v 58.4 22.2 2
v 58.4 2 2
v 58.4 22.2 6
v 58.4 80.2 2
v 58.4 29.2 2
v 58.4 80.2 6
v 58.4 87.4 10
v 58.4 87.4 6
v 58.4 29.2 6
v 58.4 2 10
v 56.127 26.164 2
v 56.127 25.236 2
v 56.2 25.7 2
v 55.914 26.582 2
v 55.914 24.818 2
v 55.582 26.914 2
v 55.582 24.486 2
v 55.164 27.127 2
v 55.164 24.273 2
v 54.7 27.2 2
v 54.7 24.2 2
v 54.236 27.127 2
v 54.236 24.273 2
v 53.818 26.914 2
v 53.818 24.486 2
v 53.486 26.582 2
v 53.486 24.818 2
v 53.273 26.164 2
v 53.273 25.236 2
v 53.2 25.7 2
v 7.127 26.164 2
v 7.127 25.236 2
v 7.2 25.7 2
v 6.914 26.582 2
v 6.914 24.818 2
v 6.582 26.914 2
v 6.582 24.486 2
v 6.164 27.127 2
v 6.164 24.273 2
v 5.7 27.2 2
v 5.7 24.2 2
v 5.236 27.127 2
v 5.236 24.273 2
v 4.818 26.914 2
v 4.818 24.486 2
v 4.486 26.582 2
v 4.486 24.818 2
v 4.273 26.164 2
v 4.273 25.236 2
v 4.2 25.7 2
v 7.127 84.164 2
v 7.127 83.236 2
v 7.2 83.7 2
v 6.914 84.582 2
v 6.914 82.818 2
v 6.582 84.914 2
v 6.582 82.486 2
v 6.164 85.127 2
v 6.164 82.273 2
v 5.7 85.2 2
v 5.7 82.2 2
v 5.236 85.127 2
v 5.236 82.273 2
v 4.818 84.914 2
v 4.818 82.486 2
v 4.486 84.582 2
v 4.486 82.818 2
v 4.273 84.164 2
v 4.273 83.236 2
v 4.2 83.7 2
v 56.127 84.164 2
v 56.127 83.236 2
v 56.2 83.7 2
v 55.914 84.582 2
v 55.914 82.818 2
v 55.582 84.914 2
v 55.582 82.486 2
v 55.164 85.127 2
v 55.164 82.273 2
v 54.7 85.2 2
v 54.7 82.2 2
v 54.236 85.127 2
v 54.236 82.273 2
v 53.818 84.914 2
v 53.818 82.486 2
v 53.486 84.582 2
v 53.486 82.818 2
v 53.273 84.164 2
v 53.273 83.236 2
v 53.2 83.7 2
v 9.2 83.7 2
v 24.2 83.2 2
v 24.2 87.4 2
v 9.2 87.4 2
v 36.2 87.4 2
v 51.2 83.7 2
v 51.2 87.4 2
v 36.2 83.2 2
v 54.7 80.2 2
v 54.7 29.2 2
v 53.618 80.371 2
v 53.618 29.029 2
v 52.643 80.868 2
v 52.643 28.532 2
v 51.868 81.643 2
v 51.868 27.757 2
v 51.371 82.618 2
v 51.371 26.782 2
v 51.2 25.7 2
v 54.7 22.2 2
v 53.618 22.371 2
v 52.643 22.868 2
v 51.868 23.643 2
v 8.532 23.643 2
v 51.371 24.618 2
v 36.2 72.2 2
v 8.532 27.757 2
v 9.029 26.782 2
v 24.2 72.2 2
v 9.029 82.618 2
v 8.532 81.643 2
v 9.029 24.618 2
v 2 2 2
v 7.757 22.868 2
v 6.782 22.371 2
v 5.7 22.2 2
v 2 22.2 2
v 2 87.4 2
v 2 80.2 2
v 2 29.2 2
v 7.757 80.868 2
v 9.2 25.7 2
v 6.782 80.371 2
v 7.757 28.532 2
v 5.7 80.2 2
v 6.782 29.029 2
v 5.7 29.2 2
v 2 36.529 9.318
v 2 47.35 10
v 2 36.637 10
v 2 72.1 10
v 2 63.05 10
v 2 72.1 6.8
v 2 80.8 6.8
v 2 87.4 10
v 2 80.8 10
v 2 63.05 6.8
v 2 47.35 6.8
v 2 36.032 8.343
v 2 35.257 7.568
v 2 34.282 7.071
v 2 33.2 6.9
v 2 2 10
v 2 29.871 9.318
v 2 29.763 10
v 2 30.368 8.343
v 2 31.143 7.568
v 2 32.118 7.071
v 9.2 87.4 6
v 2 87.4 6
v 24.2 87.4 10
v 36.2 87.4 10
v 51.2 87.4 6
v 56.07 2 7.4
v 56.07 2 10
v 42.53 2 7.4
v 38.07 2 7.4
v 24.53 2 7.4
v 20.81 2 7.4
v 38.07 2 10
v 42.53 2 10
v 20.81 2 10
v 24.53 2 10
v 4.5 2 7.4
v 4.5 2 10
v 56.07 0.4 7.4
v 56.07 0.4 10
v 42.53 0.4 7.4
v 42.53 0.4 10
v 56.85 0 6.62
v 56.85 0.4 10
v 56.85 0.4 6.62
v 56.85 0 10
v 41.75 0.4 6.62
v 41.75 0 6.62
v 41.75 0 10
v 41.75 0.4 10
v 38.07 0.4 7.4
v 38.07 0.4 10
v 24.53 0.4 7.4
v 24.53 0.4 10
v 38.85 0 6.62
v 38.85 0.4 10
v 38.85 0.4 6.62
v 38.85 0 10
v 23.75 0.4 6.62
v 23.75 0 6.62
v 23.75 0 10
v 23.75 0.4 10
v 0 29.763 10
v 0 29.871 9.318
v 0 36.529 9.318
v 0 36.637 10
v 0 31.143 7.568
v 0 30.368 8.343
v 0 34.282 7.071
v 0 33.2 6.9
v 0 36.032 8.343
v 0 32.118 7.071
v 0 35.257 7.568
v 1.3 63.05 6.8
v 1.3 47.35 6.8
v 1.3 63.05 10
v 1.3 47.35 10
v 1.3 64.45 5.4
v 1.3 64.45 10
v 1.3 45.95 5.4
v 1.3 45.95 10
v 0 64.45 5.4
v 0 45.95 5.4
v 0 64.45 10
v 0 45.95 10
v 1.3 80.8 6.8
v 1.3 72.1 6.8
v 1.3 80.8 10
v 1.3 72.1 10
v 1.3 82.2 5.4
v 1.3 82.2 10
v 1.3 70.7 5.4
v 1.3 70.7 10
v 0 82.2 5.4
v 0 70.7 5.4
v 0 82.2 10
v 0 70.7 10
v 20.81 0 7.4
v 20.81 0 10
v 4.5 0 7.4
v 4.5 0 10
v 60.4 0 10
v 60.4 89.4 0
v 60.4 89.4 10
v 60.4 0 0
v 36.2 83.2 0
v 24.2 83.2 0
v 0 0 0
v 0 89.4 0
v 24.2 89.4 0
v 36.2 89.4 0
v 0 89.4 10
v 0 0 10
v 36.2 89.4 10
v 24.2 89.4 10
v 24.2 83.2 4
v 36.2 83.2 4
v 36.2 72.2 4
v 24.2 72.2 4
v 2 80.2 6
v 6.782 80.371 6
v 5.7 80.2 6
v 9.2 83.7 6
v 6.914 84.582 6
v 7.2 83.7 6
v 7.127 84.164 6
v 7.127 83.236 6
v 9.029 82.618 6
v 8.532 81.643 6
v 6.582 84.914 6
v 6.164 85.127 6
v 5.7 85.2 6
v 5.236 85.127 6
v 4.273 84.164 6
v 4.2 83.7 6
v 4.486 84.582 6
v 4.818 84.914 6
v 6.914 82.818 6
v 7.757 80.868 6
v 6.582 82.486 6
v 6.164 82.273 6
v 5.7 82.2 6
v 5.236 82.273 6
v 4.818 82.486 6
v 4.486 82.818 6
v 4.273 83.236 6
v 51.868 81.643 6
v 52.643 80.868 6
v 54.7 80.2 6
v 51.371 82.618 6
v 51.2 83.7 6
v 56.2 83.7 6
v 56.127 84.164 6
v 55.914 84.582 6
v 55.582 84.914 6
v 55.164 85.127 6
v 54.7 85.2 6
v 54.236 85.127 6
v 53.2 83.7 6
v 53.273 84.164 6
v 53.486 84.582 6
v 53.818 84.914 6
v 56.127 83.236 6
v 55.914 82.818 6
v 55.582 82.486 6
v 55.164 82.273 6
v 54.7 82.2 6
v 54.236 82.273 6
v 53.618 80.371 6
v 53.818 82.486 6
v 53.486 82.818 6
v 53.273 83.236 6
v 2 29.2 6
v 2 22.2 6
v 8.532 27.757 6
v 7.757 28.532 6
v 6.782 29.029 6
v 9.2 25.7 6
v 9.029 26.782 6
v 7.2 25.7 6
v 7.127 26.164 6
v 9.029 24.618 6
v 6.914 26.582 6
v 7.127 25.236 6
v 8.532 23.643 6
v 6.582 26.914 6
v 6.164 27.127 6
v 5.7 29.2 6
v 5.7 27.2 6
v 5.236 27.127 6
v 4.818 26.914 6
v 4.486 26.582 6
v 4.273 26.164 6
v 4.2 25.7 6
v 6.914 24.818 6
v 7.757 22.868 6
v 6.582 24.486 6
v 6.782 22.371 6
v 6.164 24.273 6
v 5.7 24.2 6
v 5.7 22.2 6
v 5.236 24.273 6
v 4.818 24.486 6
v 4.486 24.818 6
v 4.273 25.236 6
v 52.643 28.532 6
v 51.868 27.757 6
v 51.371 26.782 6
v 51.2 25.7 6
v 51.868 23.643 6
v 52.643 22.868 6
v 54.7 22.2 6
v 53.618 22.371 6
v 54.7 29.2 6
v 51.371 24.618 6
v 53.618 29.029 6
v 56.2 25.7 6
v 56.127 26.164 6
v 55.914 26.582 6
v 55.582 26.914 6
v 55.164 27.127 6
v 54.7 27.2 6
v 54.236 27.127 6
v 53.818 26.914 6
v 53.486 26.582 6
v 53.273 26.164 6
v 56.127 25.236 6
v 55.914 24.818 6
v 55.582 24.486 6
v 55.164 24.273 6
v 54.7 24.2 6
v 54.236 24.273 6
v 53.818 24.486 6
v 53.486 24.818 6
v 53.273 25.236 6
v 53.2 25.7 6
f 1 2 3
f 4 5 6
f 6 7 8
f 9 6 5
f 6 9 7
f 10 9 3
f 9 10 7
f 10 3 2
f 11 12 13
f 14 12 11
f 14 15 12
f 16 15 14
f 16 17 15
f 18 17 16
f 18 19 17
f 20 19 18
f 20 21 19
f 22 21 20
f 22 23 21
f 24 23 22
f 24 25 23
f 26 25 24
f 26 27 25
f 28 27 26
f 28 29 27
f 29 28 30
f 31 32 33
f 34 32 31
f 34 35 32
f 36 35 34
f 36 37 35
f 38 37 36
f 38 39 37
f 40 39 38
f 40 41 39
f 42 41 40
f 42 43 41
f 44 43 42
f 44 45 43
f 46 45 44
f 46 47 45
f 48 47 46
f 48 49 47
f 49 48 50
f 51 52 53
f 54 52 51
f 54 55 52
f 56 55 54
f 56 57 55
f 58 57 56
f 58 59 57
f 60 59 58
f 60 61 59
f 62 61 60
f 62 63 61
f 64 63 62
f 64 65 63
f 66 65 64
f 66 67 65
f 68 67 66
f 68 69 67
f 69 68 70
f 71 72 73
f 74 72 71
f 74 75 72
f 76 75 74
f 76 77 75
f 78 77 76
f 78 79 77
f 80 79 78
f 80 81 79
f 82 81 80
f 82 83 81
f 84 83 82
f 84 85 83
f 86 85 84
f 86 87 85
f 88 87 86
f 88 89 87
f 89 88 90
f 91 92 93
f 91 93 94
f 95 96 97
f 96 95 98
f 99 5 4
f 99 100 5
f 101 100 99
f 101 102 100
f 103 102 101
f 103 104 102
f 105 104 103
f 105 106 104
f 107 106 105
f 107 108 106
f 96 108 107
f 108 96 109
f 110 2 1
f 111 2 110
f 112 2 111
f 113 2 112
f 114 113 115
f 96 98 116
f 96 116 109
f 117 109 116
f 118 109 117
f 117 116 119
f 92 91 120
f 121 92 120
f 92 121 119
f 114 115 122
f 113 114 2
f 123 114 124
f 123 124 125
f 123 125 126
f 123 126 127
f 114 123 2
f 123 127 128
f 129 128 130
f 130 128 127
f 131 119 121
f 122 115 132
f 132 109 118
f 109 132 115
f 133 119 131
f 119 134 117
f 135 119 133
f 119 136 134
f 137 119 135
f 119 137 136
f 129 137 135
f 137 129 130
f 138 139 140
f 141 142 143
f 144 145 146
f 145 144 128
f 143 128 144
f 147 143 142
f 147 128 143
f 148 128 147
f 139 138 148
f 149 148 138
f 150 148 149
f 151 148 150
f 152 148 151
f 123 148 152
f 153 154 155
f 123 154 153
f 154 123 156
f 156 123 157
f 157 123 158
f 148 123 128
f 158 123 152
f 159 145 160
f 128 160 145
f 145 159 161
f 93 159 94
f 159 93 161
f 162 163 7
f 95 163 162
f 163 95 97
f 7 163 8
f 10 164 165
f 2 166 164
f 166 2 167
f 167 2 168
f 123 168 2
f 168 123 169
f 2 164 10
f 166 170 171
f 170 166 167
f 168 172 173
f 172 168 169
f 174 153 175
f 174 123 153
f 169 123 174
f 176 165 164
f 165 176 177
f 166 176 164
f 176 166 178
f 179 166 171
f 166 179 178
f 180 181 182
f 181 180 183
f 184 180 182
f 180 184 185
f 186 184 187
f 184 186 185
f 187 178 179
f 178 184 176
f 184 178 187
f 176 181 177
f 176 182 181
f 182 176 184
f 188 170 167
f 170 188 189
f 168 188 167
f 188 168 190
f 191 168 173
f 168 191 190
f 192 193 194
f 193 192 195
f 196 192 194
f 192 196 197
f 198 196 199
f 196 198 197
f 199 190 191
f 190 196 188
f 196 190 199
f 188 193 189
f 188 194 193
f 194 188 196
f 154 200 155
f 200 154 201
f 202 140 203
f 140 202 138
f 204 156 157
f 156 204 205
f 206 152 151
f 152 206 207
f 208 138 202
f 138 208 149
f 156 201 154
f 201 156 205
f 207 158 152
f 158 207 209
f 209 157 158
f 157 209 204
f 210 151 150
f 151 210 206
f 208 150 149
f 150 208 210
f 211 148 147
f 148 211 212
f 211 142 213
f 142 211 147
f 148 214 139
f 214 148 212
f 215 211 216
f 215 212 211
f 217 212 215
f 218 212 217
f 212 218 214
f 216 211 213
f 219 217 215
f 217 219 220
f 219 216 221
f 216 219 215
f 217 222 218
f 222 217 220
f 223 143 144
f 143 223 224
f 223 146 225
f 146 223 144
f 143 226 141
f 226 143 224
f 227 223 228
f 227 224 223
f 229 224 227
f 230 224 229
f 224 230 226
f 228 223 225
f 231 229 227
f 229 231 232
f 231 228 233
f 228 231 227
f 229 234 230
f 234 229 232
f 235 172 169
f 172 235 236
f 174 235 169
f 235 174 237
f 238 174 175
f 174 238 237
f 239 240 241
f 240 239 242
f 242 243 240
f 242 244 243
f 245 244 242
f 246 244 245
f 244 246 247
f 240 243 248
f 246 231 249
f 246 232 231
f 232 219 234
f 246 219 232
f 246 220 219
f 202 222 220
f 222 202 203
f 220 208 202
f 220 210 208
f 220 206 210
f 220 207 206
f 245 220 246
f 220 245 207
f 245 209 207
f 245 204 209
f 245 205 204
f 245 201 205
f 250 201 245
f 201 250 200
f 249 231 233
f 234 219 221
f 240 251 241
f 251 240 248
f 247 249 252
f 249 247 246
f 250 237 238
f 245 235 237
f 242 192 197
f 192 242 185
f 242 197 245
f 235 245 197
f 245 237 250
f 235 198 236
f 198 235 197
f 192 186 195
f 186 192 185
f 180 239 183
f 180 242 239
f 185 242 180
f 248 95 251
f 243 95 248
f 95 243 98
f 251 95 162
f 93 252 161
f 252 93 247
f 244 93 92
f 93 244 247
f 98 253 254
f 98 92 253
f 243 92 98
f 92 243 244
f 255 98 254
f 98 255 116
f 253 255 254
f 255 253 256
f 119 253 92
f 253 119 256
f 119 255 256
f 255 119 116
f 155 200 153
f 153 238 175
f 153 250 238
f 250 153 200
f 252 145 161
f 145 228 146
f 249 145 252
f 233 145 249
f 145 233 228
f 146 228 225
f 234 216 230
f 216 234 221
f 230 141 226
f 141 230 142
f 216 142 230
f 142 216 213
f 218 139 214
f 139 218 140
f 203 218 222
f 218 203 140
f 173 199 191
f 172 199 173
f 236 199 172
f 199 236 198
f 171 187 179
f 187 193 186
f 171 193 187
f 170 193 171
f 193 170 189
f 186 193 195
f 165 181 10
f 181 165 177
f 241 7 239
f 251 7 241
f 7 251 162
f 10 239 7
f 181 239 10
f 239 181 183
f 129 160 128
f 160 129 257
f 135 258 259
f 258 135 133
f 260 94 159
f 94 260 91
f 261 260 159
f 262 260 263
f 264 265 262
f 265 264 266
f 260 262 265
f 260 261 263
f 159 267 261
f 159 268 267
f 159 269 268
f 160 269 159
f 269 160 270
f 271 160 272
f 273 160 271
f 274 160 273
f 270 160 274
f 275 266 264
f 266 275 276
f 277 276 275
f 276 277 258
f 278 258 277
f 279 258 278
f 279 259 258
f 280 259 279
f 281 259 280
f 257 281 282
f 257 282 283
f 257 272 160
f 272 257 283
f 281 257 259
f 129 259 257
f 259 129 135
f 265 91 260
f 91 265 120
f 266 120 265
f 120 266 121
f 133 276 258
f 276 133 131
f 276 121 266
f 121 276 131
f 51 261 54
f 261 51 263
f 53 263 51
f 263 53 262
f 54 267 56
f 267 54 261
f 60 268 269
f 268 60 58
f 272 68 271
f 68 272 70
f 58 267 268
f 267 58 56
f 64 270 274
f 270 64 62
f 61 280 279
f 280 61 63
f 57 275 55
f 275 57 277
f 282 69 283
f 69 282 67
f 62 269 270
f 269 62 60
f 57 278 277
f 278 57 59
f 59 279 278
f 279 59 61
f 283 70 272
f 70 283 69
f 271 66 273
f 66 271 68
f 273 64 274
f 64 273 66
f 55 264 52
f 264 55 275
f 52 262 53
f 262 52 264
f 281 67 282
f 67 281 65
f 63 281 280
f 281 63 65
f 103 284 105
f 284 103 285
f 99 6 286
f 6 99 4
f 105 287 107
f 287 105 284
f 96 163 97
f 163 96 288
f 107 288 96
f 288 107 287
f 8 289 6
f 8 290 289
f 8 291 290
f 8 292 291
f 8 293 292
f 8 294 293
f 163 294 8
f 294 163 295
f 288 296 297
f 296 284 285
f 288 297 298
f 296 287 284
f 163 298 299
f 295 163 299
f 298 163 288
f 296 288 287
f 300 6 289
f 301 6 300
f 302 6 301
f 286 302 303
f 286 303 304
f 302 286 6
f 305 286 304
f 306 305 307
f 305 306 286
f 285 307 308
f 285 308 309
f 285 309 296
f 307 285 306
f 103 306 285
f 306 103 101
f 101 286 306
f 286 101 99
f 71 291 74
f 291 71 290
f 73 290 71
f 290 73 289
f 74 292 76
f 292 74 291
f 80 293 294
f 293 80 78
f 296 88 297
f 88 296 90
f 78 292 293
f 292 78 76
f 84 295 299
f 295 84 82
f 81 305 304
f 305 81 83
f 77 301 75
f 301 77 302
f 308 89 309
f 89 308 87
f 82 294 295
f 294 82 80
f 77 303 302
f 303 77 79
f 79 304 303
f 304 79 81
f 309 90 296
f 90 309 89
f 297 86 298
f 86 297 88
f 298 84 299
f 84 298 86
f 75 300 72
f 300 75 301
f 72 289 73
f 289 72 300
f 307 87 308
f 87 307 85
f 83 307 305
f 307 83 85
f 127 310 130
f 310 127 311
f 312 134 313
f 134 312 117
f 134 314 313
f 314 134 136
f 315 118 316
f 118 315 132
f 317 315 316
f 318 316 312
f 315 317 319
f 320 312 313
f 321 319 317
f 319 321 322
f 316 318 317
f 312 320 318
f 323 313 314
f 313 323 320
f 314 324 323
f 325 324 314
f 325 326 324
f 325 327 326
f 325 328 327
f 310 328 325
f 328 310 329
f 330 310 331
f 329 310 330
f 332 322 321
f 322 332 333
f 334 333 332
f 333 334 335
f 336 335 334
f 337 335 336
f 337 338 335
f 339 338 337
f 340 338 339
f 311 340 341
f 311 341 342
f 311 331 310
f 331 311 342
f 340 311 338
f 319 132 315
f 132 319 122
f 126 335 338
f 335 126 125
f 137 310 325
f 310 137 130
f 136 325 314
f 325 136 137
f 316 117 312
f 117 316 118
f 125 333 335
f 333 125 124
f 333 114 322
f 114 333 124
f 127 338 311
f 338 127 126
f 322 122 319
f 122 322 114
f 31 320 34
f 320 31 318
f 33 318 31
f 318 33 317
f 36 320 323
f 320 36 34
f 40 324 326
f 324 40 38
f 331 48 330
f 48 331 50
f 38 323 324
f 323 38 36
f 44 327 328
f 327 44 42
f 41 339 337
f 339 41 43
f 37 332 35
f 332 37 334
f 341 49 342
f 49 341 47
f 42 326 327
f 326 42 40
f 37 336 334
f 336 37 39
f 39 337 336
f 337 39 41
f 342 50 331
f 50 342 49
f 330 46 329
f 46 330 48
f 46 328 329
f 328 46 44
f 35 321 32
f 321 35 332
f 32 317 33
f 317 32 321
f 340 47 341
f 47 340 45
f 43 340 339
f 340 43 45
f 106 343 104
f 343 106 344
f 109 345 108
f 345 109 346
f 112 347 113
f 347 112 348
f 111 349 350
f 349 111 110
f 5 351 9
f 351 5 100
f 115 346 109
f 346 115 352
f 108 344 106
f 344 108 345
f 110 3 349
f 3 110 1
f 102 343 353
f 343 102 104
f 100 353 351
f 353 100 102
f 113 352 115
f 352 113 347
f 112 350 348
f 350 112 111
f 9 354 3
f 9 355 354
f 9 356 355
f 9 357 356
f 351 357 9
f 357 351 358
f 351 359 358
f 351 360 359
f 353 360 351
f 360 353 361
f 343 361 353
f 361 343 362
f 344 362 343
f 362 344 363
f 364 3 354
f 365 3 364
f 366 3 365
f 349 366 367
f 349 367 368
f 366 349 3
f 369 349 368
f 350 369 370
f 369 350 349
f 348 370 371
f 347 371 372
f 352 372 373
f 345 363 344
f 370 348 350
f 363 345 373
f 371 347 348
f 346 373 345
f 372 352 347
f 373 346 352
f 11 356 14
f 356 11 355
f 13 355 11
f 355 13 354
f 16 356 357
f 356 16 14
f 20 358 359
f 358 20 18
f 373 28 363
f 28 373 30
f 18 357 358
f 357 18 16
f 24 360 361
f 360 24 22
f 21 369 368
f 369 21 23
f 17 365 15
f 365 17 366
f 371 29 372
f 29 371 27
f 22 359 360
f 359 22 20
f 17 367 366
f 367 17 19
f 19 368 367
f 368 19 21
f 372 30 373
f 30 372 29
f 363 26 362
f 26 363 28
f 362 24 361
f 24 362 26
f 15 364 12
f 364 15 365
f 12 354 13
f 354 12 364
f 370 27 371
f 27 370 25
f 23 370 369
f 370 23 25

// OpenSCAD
/*
 * Raspberry Pi3 case for Prusa MK3

 * Originally not intended for use with the Prusa MK3; I just wanted a openscad code base to work with to make future cases.
 * I have borrowed the standoff design and the supports at the ports from https://www.thingiverse.com/thing:1325370
 
*/

/* [Main] */

// Which part to render
part = "base"; // [ lid: Lid, base: Base, both: Box ]

// Make slot for the camera cable
camera_slot = "true"; // [ true: Yes, false: No ]

// Make slot for the video cable
video_slot = "true"; // [ true: Yes, false: No ]

// Make slot for the gpio_connector (not implemented)
gpio_slot = "true"; // [ true: Yes, false: No ]

// Prusa i3 Mk3 mount
mk3_mount = "false"; // [ true: Yes, false: No ]

// Cover holes with single layer, helps some screw hole avoid need for supports, requires to be punched through afterwards ( thanks Angus for the tip )
hole_covers = "true"; // [ true: Yes, false: No ]

/* [Hidden] */

board = [85, 56 , 1.3 ];  //dimension of rasp pi
t     = 1.40;             //Thickness of rasp pi board
p     = 3;              //Thickness of plastic case

_t_wall    = 2;              // Thickness of outer walls
_t_b  = 2;              // Thickness of top and bottom
_rpi_w = 56;
_rpi_l = 85;
_rpi_padding = 0.2;
_rpi_t = 1.4;
_rpi_hole_l_offset = 58;

_inner_h = 12.8; // Just guessing here

_h_rpi_offset = 4 + _t_b;

// This cannot be fiddle with too much as it will break the stereo jack hole
_split_offset = 10;

_hole_offset = 3.5;

_outer_l = _t_wall*2 + _rpi_padding*2 + _rpi_l;
_outer_w = _t_wall*2 + _rpi_padding*2 + _rpi_w;
_outer_h = _t_b*2+_inner_h+_h_rpi_offset;

// translate([_t_wall+_rpi_padding,_t_wall+_rpi_padding,_h_rpi_offset]) rpi();

$fn=20;

//base();
//lid();
//box();

show();

module show() {
    if (part == "lid") {
        rotate([0,180,0]) translate([1,0,-_outer_h]) lid();
    } else if (part == "base") {
        base();
    } else {
        lid();
        base();
    }
}

module rpi() {
    difference() {
        union() {
            cube([_rpi_w,_rpi_l,_rpi_t]);


            // SD card
            _sd_width = 11;
            _sd_depth = 3;
            translate([_rpi_w/2-_sd_width/2,_rpi_l-_t_wall,-_rpi_t-1])
                cube([_sd_width,_sd_depth+_rpi_padding+_t_wall,1]);

            // USB 1
            //usb1  =  [[70   ,21.4 ,0] ,[17.4 ,15.3  , 17.4] ,[0,   -2,    0] , [0,   4, 10  ]];
            // 14.7 is the outer edge, the main module is 13.14
            translate([40.43,-2,_rpi_t]) {
                usb(padding=0);
            }


            // USB 2
            //usb2  =  [[70   ,39   ,0] ,[17.4 ,15.3  , 17.4] ,[0,   -2,    0] , [0,   4, 10  ]];
            translate([22.43,-2,_rpi_t]) {
                usb(padding=0);
            }


            // Ethernet
            translate([2.5,-2,_rpi_t])
                ether(padding=0);

            // Audio
            translate([0,31,_rpi_t])
                audio(padding=0);

            // HDMI
            translate([0,45.75,_rpi_t])
                hdmi(padding=0);

             // Micro USB
            translate([0,70.5,_rpi_t])
                musb(padding=0);

            // Camera
            translate([0,38.6,_rpi_t])
                cube([22.5,2.95,5.7]);

            // Video
            translate([_rpi_w/2-22.5/2,79.55,_rpi_t])
                cube([22.5,2.95,5.7]);

       }


        // holes
        translate([_hole_offset,_rpi_l-_hole_offset,-1]) cylinder(r=2.75/2,h=_rpi_t+2);
        translate([_rpi_w-_hole_offset,_rpi_l-_hole_offset,-1]) cylinder(r=2.75/2,h=_rpi_t+2);
        translate([_hole_offset,_rpi_l-3.5-_rpi_hole_l_offset,-1]) cylinder(r=2.75/2,h=_rpi_t+2);
        translate([_rpi_w-_hole_offset,_rpi_l-_hole_offset-_rpi_hole_l_offset,-1]) cylinder(r=2.75/2,h=_rpi_t+2);
    }
}

module usb(padding=0.2,extends=0.2) {
    _extra_width = (14.7-13.14);
    cube([13.14+2*padding,17.4+2*padding,15.3+padding]);
    translate([-(14.7+2*padding-13.14-2*padding)/2,-extends+0.2,-_extra_width/2]) cube([14.7+2*padding,extends,15.3+padding+_extra_width]);
}

module ether(padding=0.2,extends=0) {
    translate([0,-extends,0])
    cube([15.51+2*padding,21.45+extends,13.9+padding]);
}

module audio(padding=0.4,extends=0,hole=true) {
    $fn=20;
    difference() {
        union() {
            translate([0,0,3]) rotate([0,-90,0]) cylinder(r=3+padding,h=2+extends);
            translate([0,-3,0]) cube([11,6,6]);
        }
        if (hole) {
            translate([5,0,3]) rotate([0,-90,0]) cylinder(r=1.5,h=11);
        }
    }
}

module hdmi() {
    difference() {
        union() {
            translate([1,0,0]) cube([10.7,14.5,6.4]);
            hull() {
                translate([-1,0,2]) cube([10.7,14.5,4.4]);
                translate([-1,1,1]) cube([10.7,12.5,5.4]);
            }
        }
        hull() {
            translate([-2,0.5,2.3]) cube([10.7,13.5,3.6]);
            translate([-2,1.6,1.5]) cube([10.7,11.7,2]);
        }
    }
}

module hdmi_hole(padding=0.6,extends=5,outer_padding=2) {
    union() {
        translate([-1-0.1,-padding,-padding])
            cube([10.7+0.1,14.5+padding*2,6.4+padding*2]);

        translate([-1-extends,-outer_padding,-outer_padding])
            cube([extends,14.5+outer_padding*2,6.4+outer_padding*2]);
    }
}

module musb() {
    difference() {
        union() {
            translate([1,0,0]) cube([5.7,7.5,3]);
            hull() {
                translate([-1,0,1]) cube([5.7,7.5,2]);
                translate([-1,1,0.5]) cube([5.7,5.5,2]);
            }
        }
        hull() {
            translate([-1.1,0.2,1.2]) cube([5.7,7.1,1.6]);
            translate([-1.1,1.2,0.7]) cube([5.7,5.1,2]);
        }
    }
}

module musb_hole(padding=0.6,extends=5,outer_padding=2) {
    union() {
        translate([-1-0.1,-padding,-padding])
            cube([5.7+0.1,7.5+padding*2,3+padding*2]);

        translate([-1-extends,-outer_padding,-outer_padding])
            cube([extends,7.5+outer_padding*2,3+outer_padding*2]);
    }
}


module box() {
    
    _sd_width = 12;
    _sd_depth = 3;
    _sd_inset = 4;

    difference() {

        cube([_t_wall*2+_rpi_padding*2+_rpi_w,_t_wall*2+_rpi_padding*2+_rpi_l,_outer_h]);

        difference() {
            translate([_t_wall,_t_wall,_t_b])
                cube([_rpi_padding*2+_rpi_w,_rpi_padding*2+_rpi_l,_outer_h-2*_t_b]);

            translate([0,_t_wall,_outer_h-_t_b])
            rotate([0,90,0])
            linear_extrude(height=_outer_w)
                polygon([[0,0],[0,(_outer_h-_split_offset-_t_b)*0.8],[_outer_h-_split_offset-_t_b,0]]);

        }


        _hole_padding=0.2;

        // SD card slot
        // We assume the slot is "almost" centered
        translate([_t_wall + _rpi_padding + _rpi_w/2 - _sd_width/2, _outer_l-_t_wall-_rpi_padding-_sd_inset,-1])
            cube([_sd_width,_sd_depth+_rpi_padding+_t_wall+_sd_inset+1,_h_rpi_offset+1]);

        translate([_t_wall+_rpi_padding,_t_wall+_rpi_padding,_h_rpi_offset+_rpi_t]) {

            // USB 1
            translate([40.43-_hole_padding/2,-2,0]) {
                usb(padding=_hole_padding,extends=_t_wall);
            }

            // USB 2
            translate([22.43-_hole_padding/2,-2,0]) {
                usb(padding=_hole_padding,extends=_t_wall);
            }

            // Ether
            _ether_padding = _hole_padding + 0.2;
            translate([2.5-_ether_padding/2,-2,0])
                ether(padding=_ether_padding,extends=_t_wall);

            // Audio
            translate([0,31,0])
                audio(padding=0.5,extends=2,hole=false);

            // HDMI
            translate([0.1,45.75,0])
                hdmi_hole(extends=_t_wall*2);

            // Micro USB
            translate([0.1,70.5,0])
                musb_hole();

        }

        // Camera
        if (camera_slot == "true") {
            translate([_t_wall+_rpi_padding,_t_wall+_rpi_padding+38.6,_t_b+_inner_h])
                rounded_slot(22.5,2.95,20);
        }

        if (video_slot == "true") {
            // Video
            translate([_t_wall+_rpi_padding+_rpi_w/2-22.5/2,_t_wall+_rpi_padding+79.55,,_t_b+_inner_h])
                rounded_slot(22.5,2.95,20);
        }

        if (gpio_slot == "true") {
            translate([_t_wall+_rpi_padding+49.9,_t_wall+_rpi_padding+27,5]) cube([5.1,51,20]);
        }

        // Cooling
        translate([_t_wall+_rpi_padding+16,_t_wall+_rpi_padding+20,_t_b+_inner_h]) {
            translate([0,0,0]) rotate([0,0,45]) rounded_slot(22.5,2.95,20);
            translate([8,0,0]) rotate([0,0,45]) rounded_slot(22.5,2.95,20);
            translate([16,0,0]) rotate([0,0,45]) rounded_slot(22.5,2.95,20);
            if (gpio_slot == "true") {
               translate([24,0,0]) rotate([0,0,45]) rounded_slot(22.5/2,2.95,20);
            } else {
               translate([24,0,0]) rotate([0,0,45]) rounded_slot(22.5,2.95,20);
            }

        }

        translate([_t_wall+_rpi_padding+18,_t_wall+_rpi_padding+50,_t_b+_inner_h]) {
            translate([0,0,0]) rotate([0,0,125]) rounded_slot(22.5,2.95,20);
            translate([8,0,0]) rotate([0,0,125]) rounded_slot(22.5,2.95,20);
            translate([16,0,0]) rotate([0,0,125]) rounded_slot(22.5,2.95,20);
            translate([24,0,0]) rotate([0,0,125]) rounded_slot(22.5,2.95,20);
            if (gpio_slot == "true") {
                translate([32,0,0]) rotate([0,0,125]) translate([22.5/2,0,0]) rounded_slot(22.5/2,2.95,20);
            } else {
                translate([32,0,0]) rotate([0,0,125]) rounded_slot(22.5,2.95,20);
            }
        }

    }
    
    // SD card slot support
    // We assume the slot is "almost" centered
    
    translate([_t_wall + _rpi_padding + _rpi_w/2 - _sd_width/2, _outer_l-_t_wall-_rpi_padding-11-_sd_inset,0])
        cube([_sd_width,11,_h_rpi_offset-2]);



}

module rounded_slot(l,t,h) {
    translate([t/2,t/2,0])
    hull() {
        cylinder(r=t/2,h=h);
        translate([l-t,0,0]) cylinder(r=t/2,h=h);
    }
}


module lid_cut() {
    difference() {
        box();
        translate([-1,-1,_split_offset-200])
            cube([_rpi_w*2,_rpi_l*2,200]);
    }
}

module lid() {




    _standoff_r=3.5;
    // Screw standoffs
    _height_start = _h_rpi_offset+_rpi_t+0.5;
    _height = _outer_h - _height_start;
    _hole_inset_r=3;

    difference() {
        union() {
            lid_cut();

            // Flap out for the SD card
            _sd_width = 11;
            _sd_depth = 3;
            translate([_t_wall + _rpi_padding + _rpi_w/2 - _sd_width/2, _t_wall+_rpi_padding*2 + _rpi_l,_h_rpi_offset])
                cube([_sd_width,_t_wall,_h_rpi_offset+1]);

            // Standoffs
            translate([0,0,_h_rpi_offset+_rpi_t+0.5]) {
                translate([_t_wall+_rpi_padding+_hole_offset,_t_wall+_rpi_padding+_rpi_l-_hole_offset,0])
                {
                    hull() {
                        cylinder(r=_standoff_r,h=_height);
                        translate([-_standoff_r,_hole_offset+_rpi_padding-1,0]) cube([_standoff_r*2,1,_height]);
                        translate([-_hole_offset-_rpi_padding,-_standoff_r,0]) cube([1,_standoff_r*2,_height]);
                        translate([-_rpi_padding-_hole_offset,0,0])  cube([_rpi_padding+_hole_offset,_rpi_padding+_hole_offset,_height]);
                    }
                }


                translate([_t_wall+_rpi_padding+_rpi_w-_hole_offset,_t_wall+_rpi_padding+_rpi_l-_hole_offset,0])
                {
                    hull() {
                        cylinder(r=_standoff_r,h=_height);
                        translate([-_standoff_r,_hole_offset+_rpi_padding-1,0]) cube([_standoff_r*2,1,_height]);
                        translate([_hole_offset+_rpi_padding-1,-_standoff_r,0]) cube([1,_standoff_r*2,_height]);
                        translate([0,0,0])  cube([_rpi_padding+_hole_offset,_rpi_padding+_hole_offset,_height]);
                    }
                }

                translate([_t_wall+_rpi_padding+_hole_offset,_t_wall+_rpi_padding+_rpi_l-_hole_offset-_rpi_hole_l_offset,0])
                {
                    hull() {
                        cylinder(r=_standoff_r,h=_height);
                        translate([-_hole_offset-_rpi_padding,-_standoff_r,0]) cube([1,_standoff_r*2,_height]);
                    }
                }

                translate([_t_wall+_rpi_padding+_rpi_w-_hole_offset,_t_wall+_rpi_padding+_rpi_l-_hole_offset-_rpi_hole_l_offset,0])
                {
                    hull() {
                        cylinder(r=_standoff_r,h=_height);
                        translate([_hole_offset+_rpi_padding-1,-_standoff_r,0]) cube([1,_standoff_r*2,_height]);
                    }
                }
            }
        }

        // Screw holes

        _standoff_hole_r=1.7;
        translate([_t_wall+_rpi_padding,_t_wall+_rpi_padding,0]) {
            translate([_hole_offset,_rpi_l-_hole_offset,0])
            {
               translate([0,0,-1]) cylinder(r=_standoff_hole_r,h=_height*2);
               translate([0,0,_outer_h-3]) cylinder(r=_hole_inset_r,h=4);
            }

            translate([_rpi_w-_hole_offset,_rpi_l-_hole_offset,0])
            {
               translate([0,0,-1]) cylinder(r=_standoff_hole_r,h=_height*2);
                translate([0,0,_outer_h-3]) cylinder(r=_hole_inset_r,h=4);
            }

            translate([_hole_offset,_rpi_l-_hole_offset-_rpi_hole_l_offset,0])
            {
               translate([0,0,-1]) cylinder(r=_standoff_hole_r,h=_height*2);
               translate([0,0,_outer_h-3]) cylinder(r=_hole_inset_r,h=4);
            }

            translate([_rpi_w-_hole_offset,_rpi_l-_hole_offset-_rpi_hole_l_offset,0])
            {
                translate([0,0,-1]) cylinder(r=_standoff_hole_r,h=_height*2);
                translate([0,0,_outer_h-3]) cylinder(r=_hole_inset_r,h=4);
            }
        }


    }

    if (hole_covers == "true") {
        translate([_t_wall+_rpi_padding,_t_wall+_rpi_padding,_outer_h-3]) {

            translate([_hole_offset,_rpi_l-_hole_offset,0])
            {
               cylinder(r=_hole_inset_r+0.1,h=0.2);
            }

            translate([_rpi_w-_hole_offset,_rpi_l-_hole_offset,0])
            {
                cylinder(r=_hole_inset_r+0.1,h=0.2);
            }

            translate([_hole_offset,_rpi_l-_hole_offset-_rpi_hole_l_offset,0])
            {
                cylinder(r=_hole_inset_r+0.1,h=0.2);
            }

            translate([_rpi_w-_hole_offset,_rpi_l-_hole_offset-_rpi_hole_l_offset,0])
            {
                cylinder(r=_hole_inset_r+0.1,h=0.2);
            }

        }
    }

}

module base_cut() {
    difference() {
        box();
        translate([-1,-1,_split_offset])
            cube([_rpi_w*2,_rpi_l*2,(_inner_h+_h_rpi_offset)*2]);
    }
}

module base() {

    difference() {

        union() {

            base_cut();

            _standoff_r=3.5;
            _standoff_hole_r=1.5;


            // Screw standoffs
            translate([_t_wall+_rpi_padding+_hole_offset,_t_wall+_rpi_padding+_rpi_l-_hole_offset,0])
            {
                difference() {
                    hull() {
                        cylinder(r=_standoff_r,h=_h_rpi_offset);
                        translate([-_standoff_r,_hole_offset+_rpi_padding-1,0]) cube([_standoff_r*2,1,_h_rpi_offset]);
                        translate([-_hole_offset-_rpi_padding,-_standoff_r,0]) cube([1,_standoff_r*2,_h_rpi_offset]);
                        translate([-_rpi_padding-_hole_offset,0,0])  cube([_rpi_padding+_hole_offset,_rpi_padding+_hole_offset,_h_rpi_offset]);
                    }
                    translate([0,0,_t_b]) cylinder(r=_standoff_hole_r,h=_h_rpi_offset);
                }
            }


            translate([_t_wall+_rpi_padding+_rpi_w-_hole_offset,_t_wall+_rpi_padding+_rpi_l-_hole_offset,0])
            {
                difference() {
                    hull() {
                        cylinder(r=_standoff_r,h=_h_rpi_offset);
                        translate([-_standoff_r,_hole_offset+_rpi_padding-1,0]) cube([_standoff_r*2,1,_h_rpi_offset]);
                        translate([_hole_offset+_rpi_padding,-_standoff_r,0]) cube([1,_standoff_r*2,_h_rpi_offset]);
                        translate([0,0,0])  cube([_rpi_padding+_hole_offset,_rpi_padding+_hole_offset,_h_rpi_offset]);
                    }
                    translate([0,0,_t_b]) cylinder(r=_standoff_hole_r,h=_h_rpi_offset);
                }
            }

            translate([_t_wall+_rpi_padding+_hole_offset,_t_wall+_rpi_padding+_rpi_l-_hole_offset-_rpi_hole_l_offset,0])
            {
                difference() {
                    hull() {
                        cylinder(r=_standoff_r,h=_h_rpi_offset);
                        translate([-_hole_offset-_rpi_padding,-_standoff_r,0]) cube([1,_standoff_r*2,_h_rpi_offset]);
                    }
                    translate([0,0,_t_b]) cylinder(r=_standoff_hole_r,h=_h_rpi_offset);
                }
            }

            translate([_t_wall+_rpi_padding+_rpi_w-_hole_offset,_t_wall+_rpi_padding+_rpi_l-_hole_offset-_rpi_hole_l_offset,0])
            {
                difference() {
                    hull() {
                        cylinder(r=_standoff_r,h=_h_rpi_offset);
                        translate([_hole_offset+_rpi_padding,-_standoff_r,0]) cube([1,_standoff_r*2,_h_rpi_offset]);
                    }
                    translate([0,0,_t_b]) cylinder(r=_standoff_hole_r,h=_h_rpi_offset);
                }
            }
        }

        // Cut out for the SD card
        _sd_width = 12;
        _sd_depth = 3;
        translate([_t_wall + _rpi_padding + _rpi_w/2 - _sd_width/2, _outer_l-_t_wall-_rpi_padding,4])
            cube([_sd_width,_sd_depth+_rpi_padding+_t_wall+1,_h_rpi_offset+1]);

    }


    if (mk3_mount == "true") {

        translate([_outer_w,_outer_l,0])
        difference() {
            union() {
                rotate([0,-90,0])
                linear_extrude(height=4)
                    polygon([[0,-1],[_split_offset,-1],[_split_offset,0.5],[50,0.5],[50,20],[0,20]]);

                linear_extrude(height=_split_offset)
                    polygon([[-24,-1],[-4,20],[-4,20-2],[-22,-1]]);
            }

            translate([-5,10,4]) rotate([0,90,0]) cylinder(r=1.5,h=6);
            translate([-20,10,4]) rotate([0,90,0]) cylinder(r=3,h=12);
            translate([-5,10,50-3]) rotate([0,90,0]) cylinder(r=1.5,h=6);

        }
    }

}
